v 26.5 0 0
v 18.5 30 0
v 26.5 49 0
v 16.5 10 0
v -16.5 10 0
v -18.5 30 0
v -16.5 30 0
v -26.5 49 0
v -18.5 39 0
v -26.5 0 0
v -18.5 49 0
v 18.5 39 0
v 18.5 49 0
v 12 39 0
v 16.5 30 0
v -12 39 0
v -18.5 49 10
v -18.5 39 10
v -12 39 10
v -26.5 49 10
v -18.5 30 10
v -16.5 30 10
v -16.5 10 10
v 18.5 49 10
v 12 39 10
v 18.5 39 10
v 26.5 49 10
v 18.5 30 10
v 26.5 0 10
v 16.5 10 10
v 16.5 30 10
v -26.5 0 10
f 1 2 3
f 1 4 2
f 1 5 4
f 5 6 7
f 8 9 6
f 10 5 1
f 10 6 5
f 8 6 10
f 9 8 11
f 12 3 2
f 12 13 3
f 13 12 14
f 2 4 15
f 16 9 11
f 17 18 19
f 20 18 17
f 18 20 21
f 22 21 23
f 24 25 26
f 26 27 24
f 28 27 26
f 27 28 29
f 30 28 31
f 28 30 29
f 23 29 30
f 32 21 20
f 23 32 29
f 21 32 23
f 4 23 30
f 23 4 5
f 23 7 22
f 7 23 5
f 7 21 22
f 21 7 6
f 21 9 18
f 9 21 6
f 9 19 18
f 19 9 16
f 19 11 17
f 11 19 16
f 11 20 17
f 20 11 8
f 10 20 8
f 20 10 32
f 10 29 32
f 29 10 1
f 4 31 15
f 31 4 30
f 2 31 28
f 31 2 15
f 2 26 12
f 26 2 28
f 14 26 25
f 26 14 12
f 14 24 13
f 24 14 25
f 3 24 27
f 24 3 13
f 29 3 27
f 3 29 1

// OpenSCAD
// a clip to hang some fluorescent grow lights on a baker's rack for starting seeds

epsilon = .1;
x1 = 0;
x2 = 8;
x3 = 10;
x4 = 0.5 * (53-24);
x5 = 53 / 2 + epsilon;

y1 = 0;
y2 = 10;
y3 = 39 - 9;
y4 = 39;
y5 = y4 + 10;

module half_clip() {
translate([-x5 + epsilon, 0, 0])
linear_extrude(10)
polygon([
    [x1, y1],
    [x1, y5],
    [x2, y5],
    [x4, y4],
    [x2, y4],
    [x2, y3],
    [x3, y3],
    [x3, y2],
    [x5, y2],
    [x5, y1]
]);
}


half_clip();
mirror([1, 0, 0])
    half_clip();
